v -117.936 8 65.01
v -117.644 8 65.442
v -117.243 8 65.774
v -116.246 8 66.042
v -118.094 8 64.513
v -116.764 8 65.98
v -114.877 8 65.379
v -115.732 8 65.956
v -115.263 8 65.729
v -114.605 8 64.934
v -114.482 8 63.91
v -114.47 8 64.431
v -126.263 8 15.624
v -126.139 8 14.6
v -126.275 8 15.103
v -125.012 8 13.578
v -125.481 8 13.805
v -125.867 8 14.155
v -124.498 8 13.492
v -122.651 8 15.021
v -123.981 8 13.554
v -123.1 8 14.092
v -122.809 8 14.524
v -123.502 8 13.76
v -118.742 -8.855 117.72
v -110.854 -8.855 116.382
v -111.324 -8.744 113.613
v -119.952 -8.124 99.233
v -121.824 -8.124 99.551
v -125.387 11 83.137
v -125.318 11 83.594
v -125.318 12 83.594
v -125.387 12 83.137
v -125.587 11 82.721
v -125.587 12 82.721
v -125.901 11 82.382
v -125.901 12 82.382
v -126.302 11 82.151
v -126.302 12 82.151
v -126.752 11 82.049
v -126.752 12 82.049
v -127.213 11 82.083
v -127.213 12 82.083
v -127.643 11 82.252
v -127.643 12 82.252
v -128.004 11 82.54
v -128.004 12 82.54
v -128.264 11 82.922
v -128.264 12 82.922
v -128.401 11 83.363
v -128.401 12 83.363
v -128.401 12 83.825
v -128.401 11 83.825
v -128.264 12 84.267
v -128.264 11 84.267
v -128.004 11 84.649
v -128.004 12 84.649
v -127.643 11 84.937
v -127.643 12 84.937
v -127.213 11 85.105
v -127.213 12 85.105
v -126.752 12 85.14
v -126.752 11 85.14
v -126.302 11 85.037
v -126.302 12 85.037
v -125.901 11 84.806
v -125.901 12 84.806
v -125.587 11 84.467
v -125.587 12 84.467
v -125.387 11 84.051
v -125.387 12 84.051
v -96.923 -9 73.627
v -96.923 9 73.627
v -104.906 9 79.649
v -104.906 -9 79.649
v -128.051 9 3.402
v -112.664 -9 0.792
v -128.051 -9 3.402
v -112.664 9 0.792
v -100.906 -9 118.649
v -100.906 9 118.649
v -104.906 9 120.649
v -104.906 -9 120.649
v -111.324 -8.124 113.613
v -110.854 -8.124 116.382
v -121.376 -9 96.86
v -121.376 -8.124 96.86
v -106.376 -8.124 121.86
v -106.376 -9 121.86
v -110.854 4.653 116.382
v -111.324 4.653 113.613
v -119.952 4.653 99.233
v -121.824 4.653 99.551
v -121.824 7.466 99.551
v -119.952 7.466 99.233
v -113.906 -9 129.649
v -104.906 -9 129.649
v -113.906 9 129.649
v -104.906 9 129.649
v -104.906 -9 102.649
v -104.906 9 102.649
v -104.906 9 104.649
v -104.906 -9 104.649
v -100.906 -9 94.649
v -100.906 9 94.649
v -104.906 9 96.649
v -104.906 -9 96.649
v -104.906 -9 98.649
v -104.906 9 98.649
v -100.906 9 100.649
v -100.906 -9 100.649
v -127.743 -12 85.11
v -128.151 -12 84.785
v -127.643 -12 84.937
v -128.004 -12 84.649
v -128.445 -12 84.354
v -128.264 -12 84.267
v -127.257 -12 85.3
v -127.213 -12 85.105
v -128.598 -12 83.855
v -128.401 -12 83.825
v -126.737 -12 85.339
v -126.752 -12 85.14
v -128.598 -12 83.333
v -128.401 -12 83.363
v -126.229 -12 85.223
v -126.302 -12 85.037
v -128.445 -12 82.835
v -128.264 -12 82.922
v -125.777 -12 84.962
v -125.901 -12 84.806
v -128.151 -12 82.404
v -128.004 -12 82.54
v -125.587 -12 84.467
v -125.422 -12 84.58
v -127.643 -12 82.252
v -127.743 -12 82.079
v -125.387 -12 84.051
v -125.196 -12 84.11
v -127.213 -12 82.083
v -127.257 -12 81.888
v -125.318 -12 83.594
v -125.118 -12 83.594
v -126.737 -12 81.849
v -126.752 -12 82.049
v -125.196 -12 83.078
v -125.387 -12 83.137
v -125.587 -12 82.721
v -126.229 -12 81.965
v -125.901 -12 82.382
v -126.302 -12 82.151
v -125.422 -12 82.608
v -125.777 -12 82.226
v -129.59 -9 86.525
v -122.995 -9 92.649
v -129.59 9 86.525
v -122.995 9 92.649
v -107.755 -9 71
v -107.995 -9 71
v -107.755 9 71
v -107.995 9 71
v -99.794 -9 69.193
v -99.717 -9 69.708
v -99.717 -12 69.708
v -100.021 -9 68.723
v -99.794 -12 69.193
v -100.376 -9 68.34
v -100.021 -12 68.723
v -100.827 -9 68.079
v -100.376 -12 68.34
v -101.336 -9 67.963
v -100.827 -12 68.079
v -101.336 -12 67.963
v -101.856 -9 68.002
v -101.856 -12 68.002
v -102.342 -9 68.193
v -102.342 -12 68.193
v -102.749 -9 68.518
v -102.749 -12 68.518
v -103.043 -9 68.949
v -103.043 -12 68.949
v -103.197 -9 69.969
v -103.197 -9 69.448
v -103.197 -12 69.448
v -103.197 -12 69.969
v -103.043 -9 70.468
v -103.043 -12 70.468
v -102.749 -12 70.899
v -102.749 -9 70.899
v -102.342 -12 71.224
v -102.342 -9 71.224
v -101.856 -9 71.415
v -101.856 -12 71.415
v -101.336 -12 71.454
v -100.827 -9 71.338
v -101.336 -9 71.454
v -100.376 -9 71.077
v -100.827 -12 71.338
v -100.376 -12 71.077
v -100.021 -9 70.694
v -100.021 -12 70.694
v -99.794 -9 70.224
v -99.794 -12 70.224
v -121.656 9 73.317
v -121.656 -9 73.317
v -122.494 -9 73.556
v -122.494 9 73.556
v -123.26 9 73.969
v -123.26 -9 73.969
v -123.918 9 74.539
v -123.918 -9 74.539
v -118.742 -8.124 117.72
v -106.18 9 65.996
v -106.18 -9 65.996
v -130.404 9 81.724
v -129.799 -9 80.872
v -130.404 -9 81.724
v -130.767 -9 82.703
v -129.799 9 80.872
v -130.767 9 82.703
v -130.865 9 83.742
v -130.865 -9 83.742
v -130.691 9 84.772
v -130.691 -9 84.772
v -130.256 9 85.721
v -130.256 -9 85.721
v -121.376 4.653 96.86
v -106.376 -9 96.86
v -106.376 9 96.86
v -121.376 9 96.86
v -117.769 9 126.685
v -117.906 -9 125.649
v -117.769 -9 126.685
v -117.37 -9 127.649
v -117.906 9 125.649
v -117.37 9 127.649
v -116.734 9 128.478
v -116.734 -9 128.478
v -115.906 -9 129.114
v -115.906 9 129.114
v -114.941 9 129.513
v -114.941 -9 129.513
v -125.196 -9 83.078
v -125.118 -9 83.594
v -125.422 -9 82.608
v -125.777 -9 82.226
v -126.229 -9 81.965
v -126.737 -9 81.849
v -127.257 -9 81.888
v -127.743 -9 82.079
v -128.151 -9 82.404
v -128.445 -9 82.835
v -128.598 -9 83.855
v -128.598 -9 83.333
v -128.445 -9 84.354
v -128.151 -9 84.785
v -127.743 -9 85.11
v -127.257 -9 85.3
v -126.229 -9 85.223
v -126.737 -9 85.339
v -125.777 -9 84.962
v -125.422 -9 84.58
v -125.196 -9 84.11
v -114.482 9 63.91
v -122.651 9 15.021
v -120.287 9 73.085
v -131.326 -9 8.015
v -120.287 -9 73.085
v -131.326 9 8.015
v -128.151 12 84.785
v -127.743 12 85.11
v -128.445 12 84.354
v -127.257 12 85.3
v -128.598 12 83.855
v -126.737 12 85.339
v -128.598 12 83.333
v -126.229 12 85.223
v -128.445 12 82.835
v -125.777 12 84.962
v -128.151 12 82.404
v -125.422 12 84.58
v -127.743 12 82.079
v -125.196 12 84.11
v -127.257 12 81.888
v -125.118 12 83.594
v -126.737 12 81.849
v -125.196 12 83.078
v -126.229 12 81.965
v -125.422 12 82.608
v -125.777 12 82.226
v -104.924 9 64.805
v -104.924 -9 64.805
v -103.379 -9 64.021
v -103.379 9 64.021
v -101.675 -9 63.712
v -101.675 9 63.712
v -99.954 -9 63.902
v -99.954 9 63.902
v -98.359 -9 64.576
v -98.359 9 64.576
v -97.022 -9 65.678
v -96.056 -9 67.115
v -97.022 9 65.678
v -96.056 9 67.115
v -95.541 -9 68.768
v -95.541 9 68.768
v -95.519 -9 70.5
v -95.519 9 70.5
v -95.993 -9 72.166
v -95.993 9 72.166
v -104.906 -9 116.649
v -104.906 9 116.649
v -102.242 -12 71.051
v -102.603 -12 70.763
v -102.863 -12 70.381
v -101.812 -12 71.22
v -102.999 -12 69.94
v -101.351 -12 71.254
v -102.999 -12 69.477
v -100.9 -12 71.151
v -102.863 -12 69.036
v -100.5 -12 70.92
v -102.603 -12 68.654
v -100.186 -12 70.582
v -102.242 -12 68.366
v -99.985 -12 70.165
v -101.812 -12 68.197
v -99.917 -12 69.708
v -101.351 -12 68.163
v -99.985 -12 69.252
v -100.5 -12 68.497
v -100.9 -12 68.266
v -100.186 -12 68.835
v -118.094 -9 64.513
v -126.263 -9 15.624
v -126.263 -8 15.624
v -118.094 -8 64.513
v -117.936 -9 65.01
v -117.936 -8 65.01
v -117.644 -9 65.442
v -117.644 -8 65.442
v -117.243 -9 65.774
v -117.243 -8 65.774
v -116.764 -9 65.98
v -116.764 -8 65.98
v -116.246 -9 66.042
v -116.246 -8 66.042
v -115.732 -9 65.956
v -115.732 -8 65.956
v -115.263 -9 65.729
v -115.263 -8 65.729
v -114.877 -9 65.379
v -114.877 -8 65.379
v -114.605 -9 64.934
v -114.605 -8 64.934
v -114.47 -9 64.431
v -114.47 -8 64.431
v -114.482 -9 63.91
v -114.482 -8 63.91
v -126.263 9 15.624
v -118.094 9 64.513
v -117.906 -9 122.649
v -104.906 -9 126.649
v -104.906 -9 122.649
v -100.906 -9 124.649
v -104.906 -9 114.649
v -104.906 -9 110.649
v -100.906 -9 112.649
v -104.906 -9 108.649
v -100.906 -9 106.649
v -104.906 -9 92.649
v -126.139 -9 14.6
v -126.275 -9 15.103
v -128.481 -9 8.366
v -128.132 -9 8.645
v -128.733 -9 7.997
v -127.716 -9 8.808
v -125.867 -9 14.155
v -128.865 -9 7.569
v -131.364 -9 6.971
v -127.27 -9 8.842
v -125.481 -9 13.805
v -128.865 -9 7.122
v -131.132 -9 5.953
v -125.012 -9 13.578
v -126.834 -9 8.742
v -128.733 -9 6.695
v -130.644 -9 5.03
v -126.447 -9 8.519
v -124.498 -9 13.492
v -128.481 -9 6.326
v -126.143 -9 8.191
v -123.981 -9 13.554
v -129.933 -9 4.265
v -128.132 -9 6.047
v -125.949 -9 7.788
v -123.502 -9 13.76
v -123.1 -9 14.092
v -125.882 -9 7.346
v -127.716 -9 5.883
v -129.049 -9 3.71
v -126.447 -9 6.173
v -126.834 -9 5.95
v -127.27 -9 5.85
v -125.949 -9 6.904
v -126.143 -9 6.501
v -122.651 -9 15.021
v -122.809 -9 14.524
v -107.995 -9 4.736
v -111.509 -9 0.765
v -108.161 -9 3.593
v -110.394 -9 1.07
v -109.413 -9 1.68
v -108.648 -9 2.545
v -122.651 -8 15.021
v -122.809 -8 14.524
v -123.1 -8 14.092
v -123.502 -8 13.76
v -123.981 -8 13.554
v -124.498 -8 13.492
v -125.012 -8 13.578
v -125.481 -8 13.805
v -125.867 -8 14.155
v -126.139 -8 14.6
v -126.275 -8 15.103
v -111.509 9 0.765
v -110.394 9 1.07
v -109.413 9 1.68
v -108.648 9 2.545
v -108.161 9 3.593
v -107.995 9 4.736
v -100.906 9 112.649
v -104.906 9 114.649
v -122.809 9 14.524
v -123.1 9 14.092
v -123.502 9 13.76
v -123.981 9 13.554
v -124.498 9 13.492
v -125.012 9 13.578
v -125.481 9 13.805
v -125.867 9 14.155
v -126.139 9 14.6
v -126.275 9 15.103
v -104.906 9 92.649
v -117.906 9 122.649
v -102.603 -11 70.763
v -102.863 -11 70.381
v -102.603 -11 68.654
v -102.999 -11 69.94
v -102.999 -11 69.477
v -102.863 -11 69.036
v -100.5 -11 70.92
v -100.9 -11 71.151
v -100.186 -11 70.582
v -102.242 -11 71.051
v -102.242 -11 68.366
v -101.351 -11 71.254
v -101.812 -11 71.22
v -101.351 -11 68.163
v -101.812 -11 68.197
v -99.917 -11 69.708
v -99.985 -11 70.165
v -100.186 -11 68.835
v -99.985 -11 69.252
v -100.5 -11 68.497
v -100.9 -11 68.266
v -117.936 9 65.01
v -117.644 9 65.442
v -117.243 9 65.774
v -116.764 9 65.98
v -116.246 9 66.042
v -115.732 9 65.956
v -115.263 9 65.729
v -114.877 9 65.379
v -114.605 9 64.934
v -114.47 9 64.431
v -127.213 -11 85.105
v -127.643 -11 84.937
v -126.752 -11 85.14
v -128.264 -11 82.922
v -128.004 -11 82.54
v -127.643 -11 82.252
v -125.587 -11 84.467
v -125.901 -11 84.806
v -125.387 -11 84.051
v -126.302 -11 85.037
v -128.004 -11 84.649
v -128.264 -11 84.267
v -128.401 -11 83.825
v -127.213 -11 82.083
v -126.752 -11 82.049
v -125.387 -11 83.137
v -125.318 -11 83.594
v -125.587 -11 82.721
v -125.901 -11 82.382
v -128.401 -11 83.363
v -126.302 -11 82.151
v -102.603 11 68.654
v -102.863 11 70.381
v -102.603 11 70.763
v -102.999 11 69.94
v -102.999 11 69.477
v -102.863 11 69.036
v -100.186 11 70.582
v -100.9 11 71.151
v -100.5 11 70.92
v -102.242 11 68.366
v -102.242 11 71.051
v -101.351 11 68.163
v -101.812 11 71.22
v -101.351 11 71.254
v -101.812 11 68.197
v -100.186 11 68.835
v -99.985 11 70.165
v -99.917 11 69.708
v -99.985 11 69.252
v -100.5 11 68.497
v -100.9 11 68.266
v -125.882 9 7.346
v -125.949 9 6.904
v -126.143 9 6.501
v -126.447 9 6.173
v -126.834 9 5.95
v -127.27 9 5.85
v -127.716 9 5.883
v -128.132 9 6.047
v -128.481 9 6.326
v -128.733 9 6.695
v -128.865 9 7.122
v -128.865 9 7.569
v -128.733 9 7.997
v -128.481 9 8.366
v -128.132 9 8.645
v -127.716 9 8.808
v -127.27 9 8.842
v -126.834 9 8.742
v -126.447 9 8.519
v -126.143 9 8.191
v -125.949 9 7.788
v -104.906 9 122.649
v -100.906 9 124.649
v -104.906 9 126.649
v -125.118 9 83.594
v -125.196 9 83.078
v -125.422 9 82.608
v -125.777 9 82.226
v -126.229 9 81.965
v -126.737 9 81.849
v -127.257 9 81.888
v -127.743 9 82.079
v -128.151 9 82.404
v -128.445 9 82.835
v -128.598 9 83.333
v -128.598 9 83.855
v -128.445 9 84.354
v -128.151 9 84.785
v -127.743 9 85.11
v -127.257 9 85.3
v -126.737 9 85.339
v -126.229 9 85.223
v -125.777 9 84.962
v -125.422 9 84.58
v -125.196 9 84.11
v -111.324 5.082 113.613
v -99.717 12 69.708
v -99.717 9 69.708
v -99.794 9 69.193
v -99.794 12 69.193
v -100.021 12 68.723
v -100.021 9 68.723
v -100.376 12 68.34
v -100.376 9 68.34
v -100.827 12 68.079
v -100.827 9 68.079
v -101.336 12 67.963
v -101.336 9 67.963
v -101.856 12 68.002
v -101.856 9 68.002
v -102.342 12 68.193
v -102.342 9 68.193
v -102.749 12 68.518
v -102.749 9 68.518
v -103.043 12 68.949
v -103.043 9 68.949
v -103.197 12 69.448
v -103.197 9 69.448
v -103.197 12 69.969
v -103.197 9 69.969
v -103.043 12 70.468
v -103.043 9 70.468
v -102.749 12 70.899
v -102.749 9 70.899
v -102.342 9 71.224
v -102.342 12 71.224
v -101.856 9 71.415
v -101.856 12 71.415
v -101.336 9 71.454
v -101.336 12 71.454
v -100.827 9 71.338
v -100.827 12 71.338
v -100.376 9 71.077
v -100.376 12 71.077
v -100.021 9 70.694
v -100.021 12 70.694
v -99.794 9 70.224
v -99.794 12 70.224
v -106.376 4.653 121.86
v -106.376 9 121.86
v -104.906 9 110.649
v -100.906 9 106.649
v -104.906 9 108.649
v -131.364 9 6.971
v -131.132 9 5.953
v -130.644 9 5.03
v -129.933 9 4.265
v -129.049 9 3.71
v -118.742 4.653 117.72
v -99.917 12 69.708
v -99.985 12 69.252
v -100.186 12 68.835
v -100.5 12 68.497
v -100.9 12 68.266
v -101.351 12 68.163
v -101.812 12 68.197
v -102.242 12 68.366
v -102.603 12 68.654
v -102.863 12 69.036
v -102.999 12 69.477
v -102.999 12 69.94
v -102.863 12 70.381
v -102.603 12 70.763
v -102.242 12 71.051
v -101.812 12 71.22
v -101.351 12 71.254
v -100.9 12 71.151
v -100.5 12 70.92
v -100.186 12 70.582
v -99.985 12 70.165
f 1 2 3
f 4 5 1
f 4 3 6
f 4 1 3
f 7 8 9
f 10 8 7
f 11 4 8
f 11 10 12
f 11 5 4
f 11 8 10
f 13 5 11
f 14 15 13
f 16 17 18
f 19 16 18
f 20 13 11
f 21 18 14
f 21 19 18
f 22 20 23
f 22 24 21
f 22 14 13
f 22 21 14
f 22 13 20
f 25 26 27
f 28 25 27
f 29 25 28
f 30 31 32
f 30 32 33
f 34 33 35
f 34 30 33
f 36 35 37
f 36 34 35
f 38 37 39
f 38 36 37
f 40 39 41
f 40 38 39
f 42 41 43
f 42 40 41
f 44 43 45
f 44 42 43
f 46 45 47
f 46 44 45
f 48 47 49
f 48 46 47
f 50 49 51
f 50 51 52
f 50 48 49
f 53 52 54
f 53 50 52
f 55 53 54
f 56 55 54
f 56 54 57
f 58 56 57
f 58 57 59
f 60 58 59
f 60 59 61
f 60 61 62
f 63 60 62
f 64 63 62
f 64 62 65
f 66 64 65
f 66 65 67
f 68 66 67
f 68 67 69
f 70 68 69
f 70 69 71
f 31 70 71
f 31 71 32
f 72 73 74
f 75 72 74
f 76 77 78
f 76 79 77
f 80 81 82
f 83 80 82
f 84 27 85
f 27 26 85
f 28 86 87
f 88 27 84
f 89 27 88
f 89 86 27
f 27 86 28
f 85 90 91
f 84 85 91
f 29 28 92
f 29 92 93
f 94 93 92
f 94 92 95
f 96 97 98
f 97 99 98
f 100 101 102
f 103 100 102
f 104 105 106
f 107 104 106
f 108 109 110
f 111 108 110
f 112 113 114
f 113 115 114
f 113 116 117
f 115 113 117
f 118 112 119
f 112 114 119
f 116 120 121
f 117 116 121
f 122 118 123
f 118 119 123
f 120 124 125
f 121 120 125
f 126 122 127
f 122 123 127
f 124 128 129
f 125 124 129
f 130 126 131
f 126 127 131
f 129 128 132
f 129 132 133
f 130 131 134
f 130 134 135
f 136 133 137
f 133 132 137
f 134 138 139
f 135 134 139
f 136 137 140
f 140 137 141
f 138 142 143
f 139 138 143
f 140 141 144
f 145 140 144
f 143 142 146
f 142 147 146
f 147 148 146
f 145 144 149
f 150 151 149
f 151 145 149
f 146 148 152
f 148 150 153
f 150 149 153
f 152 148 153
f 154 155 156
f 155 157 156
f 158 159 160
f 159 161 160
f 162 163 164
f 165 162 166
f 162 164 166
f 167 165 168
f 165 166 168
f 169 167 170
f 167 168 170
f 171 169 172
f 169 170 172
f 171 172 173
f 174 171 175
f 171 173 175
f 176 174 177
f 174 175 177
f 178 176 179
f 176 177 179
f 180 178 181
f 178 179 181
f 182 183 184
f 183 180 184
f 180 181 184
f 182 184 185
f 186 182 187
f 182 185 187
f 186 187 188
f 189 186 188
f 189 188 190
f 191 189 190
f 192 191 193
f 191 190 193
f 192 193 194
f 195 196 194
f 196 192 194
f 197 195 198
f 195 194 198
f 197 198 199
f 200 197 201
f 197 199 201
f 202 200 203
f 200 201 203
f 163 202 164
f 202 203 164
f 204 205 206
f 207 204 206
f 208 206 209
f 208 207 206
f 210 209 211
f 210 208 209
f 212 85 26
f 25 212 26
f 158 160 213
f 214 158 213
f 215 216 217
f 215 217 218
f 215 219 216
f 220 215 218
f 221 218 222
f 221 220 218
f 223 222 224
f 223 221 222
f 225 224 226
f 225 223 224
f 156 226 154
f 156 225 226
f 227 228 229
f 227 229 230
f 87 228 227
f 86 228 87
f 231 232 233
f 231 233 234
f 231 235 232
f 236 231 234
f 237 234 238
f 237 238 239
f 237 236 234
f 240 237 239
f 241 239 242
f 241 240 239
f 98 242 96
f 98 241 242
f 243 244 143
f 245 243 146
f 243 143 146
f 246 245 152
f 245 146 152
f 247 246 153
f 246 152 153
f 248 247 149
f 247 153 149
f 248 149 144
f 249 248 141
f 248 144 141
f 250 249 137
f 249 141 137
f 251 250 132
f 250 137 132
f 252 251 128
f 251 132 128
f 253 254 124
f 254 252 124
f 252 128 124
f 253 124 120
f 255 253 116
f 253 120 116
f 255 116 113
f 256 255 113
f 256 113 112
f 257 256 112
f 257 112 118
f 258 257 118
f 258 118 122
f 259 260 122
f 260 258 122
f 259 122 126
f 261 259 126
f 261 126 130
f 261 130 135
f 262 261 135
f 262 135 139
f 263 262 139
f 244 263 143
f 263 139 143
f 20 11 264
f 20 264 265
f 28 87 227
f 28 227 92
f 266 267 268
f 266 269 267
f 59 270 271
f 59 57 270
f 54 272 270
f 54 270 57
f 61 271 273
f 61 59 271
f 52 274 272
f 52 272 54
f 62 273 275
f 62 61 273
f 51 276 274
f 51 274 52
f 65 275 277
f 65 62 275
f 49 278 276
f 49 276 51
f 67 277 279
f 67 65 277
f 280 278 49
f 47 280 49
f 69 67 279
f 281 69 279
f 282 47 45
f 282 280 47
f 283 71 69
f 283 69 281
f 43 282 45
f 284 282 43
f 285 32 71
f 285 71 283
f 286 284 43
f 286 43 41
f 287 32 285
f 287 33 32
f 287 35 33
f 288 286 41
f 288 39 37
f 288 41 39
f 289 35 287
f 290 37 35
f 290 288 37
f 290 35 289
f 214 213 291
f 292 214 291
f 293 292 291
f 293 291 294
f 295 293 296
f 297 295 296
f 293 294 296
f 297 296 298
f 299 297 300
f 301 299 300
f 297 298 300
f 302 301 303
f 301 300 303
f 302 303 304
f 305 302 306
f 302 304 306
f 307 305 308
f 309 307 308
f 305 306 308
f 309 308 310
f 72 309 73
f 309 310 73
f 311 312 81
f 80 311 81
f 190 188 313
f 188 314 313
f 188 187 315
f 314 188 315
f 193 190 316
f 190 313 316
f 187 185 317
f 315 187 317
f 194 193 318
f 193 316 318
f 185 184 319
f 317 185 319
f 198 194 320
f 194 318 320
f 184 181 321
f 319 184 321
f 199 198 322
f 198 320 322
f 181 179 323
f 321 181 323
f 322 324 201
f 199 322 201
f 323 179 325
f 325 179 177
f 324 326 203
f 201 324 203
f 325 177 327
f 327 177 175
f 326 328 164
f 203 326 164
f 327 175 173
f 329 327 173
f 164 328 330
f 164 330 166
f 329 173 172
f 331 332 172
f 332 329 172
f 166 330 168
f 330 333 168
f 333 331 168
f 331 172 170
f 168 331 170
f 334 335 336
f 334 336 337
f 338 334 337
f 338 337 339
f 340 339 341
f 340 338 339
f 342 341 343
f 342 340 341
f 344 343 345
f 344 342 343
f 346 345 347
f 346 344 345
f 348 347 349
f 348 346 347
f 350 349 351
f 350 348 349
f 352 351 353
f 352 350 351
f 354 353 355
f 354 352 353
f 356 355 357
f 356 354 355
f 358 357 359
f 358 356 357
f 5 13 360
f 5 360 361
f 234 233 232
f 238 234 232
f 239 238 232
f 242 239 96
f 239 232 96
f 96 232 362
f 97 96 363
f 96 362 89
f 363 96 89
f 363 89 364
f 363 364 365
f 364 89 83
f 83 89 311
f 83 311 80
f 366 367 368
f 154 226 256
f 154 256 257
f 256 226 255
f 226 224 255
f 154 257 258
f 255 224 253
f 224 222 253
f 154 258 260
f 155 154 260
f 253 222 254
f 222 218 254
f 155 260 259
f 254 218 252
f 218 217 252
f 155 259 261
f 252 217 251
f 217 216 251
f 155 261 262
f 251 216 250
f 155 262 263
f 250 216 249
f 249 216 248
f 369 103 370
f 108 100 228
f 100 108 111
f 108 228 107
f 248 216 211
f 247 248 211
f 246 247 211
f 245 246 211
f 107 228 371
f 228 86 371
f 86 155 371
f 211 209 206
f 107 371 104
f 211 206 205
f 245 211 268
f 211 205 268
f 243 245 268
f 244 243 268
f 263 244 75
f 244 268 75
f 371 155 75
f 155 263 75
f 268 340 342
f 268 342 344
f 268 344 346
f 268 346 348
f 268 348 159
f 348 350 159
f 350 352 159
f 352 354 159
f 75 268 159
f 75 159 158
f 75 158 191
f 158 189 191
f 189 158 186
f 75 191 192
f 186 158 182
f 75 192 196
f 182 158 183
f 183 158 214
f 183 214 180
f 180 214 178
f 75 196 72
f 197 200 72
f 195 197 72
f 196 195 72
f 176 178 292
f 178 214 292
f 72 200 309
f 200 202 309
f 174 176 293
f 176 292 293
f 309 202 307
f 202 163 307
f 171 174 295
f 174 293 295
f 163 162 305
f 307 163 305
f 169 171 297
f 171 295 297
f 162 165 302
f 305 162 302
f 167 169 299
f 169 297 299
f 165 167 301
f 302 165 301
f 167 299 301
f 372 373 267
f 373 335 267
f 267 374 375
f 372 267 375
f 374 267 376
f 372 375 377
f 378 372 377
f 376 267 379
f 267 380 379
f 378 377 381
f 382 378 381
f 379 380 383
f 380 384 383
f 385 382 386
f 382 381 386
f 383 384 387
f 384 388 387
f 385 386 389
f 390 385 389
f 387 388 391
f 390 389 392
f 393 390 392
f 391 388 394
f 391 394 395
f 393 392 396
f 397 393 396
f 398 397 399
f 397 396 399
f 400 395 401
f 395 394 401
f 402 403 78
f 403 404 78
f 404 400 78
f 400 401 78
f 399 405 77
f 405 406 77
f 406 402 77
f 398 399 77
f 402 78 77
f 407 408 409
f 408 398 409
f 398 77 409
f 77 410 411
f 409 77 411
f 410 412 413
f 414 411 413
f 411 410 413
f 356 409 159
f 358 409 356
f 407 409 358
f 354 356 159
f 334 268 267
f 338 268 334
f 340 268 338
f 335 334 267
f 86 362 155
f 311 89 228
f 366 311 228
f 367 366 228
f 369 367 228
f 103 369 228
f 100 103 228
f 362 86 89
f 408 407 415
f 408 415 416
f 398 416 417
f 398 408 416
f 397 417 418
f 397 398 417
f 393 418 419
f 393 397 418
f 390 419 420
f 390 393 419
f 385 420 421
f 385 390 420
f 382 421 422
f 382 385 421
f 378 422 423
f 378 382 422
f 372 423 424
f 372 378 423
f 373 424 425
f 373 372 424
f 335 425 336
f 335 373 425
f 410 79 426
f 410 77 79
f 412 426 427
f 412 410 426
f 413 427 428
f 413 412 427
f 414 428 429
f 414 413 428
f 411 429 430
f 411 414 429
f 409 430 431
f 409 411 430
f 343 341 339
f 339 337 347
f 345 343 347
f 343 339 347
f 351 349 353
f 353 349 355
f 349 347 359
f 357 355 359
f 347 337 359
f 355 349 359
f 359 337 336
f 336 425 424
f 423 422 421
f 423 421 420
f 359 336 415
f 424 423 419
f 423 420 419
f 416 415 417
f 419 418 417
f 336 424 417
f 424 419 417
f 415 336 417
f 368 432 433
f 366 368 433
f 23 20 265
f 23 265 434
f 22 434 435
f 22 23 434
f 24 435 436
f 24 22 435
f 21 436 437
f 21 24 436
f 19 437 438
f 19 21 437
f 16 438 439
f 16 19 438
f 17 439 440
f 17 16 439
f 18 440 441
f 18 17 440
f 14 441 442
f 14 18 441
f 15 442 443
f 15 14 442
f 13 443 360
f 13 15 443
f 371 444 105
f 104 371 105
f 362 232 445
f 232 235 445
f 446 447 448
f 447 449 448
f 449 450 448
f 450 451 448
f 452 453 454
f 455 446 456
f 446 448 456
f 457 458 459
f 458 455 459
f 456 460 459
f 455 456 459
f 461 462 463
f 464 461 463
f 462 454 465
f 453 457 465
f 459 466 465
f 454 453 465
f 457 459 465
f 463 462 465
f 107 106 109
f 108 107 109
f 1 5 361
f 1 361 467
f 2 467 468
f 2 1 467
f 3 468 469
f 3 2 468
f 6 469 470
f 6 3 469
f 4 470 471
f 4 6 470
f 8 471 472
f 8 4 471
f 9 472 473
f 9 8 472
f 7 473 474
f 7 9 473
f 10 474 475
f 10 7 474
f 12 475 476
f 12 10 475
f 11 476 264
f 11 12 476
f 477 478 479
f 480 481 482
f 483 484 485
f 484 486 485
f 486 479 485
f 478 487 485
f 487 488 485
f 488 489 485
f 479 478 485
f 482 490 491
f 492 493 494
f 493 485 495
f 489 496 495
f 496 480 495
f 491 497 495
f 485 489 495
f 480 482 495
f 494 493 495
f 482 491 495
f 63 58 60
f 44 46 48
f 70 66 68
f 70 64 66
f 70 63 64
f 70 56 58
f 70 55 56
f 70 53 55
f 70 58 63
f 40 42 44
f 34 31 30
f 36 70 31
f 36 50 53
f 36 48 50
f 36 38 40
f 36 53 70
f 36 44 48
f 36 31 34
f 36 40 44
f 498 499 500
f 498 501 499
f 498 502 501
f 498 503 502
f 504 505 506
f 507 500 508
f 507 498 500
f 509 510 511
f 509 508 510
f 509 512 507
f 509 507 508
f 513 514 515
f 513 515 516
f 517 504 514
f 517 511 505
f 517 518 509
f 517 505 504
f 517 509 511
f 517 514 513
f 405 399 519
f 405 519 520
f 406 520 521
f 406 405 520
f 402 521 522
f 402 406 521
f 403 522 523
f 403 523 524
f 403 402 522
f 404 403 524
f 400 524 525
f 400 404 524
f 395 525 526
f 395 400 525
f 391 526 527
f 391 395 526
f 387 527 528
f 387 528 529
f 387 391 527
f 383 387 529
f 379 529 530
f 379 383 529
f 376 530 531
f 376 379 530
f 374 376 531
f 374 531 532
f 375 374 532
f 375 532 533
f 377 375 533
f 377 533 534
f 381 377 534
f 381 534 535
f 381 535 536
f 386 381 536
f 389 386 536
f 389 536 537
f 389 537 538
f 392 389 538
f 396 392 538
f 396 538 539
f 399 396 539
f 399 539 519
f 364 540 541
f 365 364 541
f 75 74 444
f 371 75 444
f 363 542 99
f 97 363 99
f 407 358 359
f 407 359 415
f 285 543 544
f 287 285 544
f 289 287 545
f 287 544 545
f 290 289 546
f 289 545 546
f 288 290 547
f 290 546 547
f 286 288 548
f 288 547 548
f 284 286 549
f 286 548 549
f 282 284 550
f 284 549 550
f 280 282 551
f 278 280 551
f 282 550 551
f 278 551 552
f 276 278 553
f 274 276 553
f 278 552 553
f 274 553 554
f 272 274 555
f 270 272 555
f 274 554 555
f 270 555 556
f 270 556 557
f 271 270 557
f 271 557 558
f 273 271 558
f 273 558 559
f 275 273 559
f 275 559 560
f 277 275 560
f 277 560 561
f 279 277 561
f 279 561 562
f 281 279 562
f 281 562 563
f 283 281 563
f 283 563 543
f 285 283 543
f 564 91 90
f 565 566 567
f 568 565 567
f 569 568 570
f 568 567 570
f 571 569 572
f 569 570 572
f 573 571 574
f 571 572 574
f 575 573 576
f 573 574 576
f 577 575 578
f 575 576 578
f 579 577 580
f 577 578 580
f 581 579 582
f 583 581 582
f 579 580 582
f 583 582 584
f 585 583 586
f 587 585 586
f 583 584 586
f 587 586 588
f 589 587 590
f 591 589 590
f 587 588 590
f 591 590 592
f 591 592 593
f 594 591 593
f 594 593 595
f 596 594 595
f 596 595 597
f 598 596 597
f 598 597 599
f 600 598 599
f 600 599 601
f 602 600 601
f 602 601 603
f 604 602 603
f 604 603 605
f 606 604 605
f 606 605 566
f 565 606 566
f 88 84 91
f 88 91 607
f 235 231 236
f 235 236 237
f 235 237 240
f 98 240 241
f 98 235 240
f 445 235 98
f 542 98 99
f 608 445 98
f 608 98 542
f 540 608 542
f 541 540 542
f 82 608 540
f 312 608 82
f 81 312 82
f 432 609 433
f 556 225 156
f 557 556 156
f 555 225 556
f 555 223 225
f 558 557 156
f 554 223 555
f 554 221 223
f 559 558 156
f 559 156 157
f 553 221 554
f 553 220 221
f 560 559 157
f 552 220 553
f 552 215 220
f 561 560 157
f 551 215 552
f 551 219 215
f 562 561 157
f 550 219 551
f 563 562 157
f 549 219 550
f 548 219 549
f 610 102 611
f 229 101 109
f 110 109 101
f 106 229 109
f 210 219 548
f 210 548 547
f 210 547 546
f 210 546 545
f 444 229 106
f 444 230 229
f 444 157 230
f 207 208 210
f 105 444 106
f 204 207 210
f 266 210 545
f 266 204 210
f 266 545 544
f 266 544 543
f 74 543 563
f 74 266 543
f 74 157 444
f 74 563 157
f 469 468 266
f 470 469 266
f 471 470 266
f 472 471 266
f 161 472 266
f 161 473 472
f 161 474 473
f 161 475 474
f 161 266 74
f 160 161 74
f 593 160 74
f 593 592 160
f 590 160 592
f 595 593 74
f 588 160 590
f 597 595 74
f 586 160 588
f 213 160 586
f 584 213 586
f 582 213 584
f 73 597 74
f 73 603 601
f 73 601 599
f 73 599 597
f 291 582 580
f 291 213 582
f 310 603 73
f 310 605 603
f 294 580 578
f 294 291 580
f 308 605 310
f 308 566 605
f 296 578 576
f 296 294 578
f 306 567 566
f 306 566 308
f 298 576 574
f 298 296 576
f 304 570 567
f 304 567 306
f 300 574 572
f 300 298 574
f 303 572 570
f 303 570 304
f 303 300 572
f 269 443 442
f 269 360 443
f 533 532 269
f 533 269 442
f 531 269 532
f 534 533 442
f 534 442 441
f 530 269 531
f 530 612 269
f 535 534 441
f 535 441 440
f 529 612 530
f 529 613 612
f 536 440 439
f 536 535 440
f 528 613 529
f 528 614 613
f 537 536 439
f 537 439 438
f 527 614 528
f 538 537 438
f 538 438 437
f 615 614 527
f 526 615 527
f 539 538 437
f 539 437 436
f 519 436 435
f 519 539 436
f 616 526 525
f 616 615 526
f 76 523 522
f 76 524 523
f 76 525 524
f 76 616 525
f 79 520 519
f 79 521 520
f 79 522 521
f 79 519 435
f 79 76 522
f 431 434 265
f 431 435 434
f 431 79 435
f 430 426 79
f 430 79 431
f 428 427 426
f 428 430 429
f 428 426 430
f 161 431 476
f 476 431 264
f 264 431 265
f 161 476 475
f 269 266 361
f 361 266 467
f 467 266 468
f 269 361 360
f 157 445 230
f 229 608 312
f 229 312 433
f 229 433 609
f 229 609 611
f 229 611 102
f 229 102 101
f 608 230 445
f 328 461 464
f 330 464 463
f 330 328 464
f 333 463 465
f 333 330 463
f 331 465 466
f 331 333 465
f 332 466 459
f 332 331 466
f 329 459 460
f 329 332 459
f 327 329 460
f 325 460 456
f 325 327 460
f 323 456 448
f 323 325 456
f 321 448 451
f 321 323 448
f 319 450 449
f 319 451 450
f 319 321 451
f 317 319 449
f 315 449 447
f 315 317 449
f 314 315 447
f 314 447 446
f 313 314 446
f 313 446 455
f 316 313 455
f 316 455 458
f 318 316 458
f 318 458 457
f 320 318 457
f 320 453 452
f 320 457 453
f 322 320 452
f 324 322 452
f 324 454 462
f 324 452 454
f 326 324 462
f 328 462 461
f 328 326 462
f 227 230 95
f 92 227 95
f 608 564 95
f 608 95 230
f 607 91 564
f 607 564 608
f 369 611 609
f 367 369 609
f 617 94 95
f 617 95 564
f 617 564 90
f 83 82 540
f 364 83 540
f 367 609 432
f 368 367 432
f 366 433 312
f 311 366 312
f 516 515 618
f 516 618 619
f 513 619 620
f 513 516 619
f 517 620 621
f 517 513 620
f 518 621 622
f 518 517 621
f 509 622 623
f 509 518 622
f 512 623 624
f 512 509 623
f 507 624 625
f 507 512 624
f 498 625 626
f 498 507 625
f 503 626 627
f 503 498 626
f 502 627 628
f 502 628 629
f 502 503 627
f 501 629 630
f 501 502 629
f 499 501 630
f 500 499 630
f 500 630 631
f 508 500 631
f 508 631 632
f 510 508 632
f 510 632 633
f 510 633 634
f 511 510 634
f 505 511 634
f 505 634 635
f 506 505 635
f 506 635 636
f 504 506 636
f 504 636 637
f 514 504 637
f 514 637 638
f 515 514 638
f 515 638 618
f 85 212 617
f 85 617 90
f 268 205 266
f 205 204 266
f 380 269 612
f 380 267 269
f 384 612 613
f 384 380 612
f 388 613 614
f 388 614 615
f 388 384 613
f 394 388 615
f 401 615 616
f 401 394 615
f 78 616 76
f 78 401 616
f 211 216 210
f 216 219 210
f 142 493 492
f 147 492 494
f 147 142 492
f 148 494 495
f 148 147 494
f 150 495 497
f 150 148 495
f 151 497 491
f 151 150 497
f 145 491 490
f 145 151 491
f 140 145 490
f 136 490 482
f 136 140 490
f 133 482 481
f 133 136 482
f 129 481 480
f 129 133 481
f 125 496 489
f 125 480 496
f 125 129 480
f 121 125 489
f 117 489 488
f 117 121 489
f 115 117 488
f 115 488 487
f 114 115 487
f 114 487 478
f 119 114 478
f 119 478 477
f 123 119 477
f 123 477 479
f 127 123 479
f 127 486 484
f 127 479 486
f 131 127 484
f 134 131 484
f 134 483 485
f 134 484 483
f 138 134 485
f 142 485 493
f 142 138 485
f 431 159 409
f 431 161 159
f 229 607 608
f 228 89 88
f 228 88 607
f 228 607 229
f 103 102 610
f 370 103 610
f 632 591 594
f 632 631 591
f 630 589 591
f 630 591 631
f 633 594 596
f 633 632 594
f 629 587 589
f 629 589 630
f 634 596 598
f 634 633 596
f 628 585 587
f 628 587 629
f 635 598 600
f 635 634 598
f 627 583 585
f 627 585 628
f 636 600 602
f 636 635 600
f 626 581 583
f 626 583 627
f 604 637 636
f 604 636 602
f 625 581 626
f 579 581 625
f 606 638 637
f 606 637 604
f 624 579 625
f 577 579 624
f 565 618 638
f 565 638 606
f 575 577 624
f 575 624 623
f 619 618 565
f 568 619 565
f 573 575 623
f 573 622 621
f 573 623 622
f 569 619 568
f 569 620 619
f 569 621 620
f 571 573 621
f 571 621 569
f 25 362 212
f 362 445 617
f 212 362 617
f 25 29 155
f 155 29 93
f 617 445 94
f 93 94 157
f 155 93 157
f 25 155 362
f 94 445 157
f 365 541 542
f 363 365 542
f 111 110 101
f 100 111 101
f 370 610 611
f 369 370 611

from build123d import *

# Parameters (mm, degrees)
BOSS_EXTRUDE2_DEPTH   = 9
FILLET3_R             = 4
FILLET4_R             = 4
FILLET5_R             = 4
BOSS_EXTRUDE3_DEPTH   = 18
LPATTERN1_COUNT       = 6
LPATTERN1_PITCH       = 6
MIRROR1_START         = -8.124245185
MIRROR1_OUTLINE_R     = 1.5
MIRROR1_DEPTH         = 12.777246129
MIRROR1_START_2       = -9
MIRROR1_2_OUTLINE_R   = 1.5
MIRROR1_2_DEPTH       = 18
MIRROR1_3_DEPTH       = 1
MIRROR1_START_3       = 8
MIRROR1_4_DEPTH       = 1
MIRROR1_START_4       = -11
MIRROR1_5_OUTLINE_R   = 1.75
MIRROR1_5_DEPTH       = 22
MIRROR1_START_5       = -12
MIRROR1_6_OUTLINE_R   = 1.75
MIRROR1_6_OUTLINE_R_2 = 1.55
MIRROR1_6_DEPTH       = 24
MIRROR1_START_6       = -136.757331166
MIRROR1_7_DEPTH       = 7.999999999


with BuildPart() as part:
    # Sketch2 → Boss-Extrude2 (new, symmetric)
    with BuildSketch(Plane(origin=(0, 0, 0), x_dir=(1, 0, 0), z_dir=(0, 1, 0))):
        Polygon((-131.994556455, -4.071203001), (-120.287458623, -73.085287508), (-107.994556455, -71), (-107.994556455, 0), align=None)
        with BuildLine():
            ThreePointArc((-106.180430892, -65.996333846), (-97.650502603, -65.078471315), (-96.922675808, -73.626711859))
            Line((-96.922675808, -73.626711859), (-104.905552704, -79.64947505))
            Line((-104.905552704, -79.64947505), (-104.905552704, -129.64947505))
            Line((-104.905552704, -129.64947505), (-117.905552704, -129.64947505))
            Line((-117.905552704, -129.64947505), (-117.905552704, -122.64947505))
            Line((-117.905552704, -122.64947505), (-122.994556455, -92.64947505))
            Line((-122.994556455, -92.64947505), (-132.520871847, -83.803610759))
            Line((-132.520871847, -83.803610759), (-122.994556455, -73.544501876))
            Line((-122.994556455, -73.544501876), (-107.994556455, -71))
            Line((-107.994556455, -71), (-107.755356075, -71))
            Line((-107.755356075, -71), (-106.180430892, -65.996333846))
        make_face()
    extrude(amount=BOSS_EXTRUDE2_DEPTH, both=True)

    # Fillet3
    fillet3_edges = [part.edges().sort_by_distance(p)[0] for p in [
        (-131.994556455, 0, 4.071203001),
        (-107.994556455, 0, 0),
    ]]
    fillet(fillet3_edges, radius=FILLET3_R)

    # Fillet4
    fillet4_edges = [part.edges().sort_by_distance(p)[0] for p in [
        (-132.520871847, 0, 83.803610759),
        (-122.994556455, 0, 73.544501876),
    ]]
    fillet(fillet4_edges, radius=FILLET4_R)

    # Fillet5
    fillet5_edges = [part.edges().sort_by_distance(p)[0] for p in [
        (-117.905552704, 0, 129.64947505),
    ]]
    fillet(fillet5_edges, radius=FILLET5_R)

    # Sketch4 → Boss-Extrude3 (add)
    with BuildSketch(Plane(origin=(0, 9, 0), x_dir=(1, 0, 0), z_dir=(0, 1, 0))):
        Polygon((-104.905552704, -126.64947505), (-104.905552704, -122.64947505), (-100.905552704, -124.64947505), align=None)
    boss_extrude3 = extrude(amount=-BOSS_EXTRUDE3_DEPTH)

    # LPattern1: Boss-Extrude3 ×6
    with Locations(*[(0, 0, -i * LPATTERN1_PITCH) for i in range(1, LPATTERN1_COUNT)]):
        add(boss_extrude3)

    # Mirror1: read off the stored shape, not the designer's step
    # Mirror1 outline → Mirror1 (cut)
    with BuildSketch(Plane(origin=(0, 0, 0), x_dir=(1, 0, 0), z_dir=(0, 1, 0)).offset(MIRROR1_START)):
        Polygon((-106.375961974, -96.859639276), (-121.375961974, -96.859639276), (-119.951756879, -99.233314435), (-121.823846672, -99.550883501), (-118.741773978, -117.719897586), (-110.854450034, -116.381943548), (-111.324238264, -113.612512127), (-106.375961974, -121.859639276), align=None)
        with Locations((-127.381917465, -7.345887954)):
            Circle(MIRROR1_OUTLINE_R)
    extrude(amount=MIRROR1_DEPTH, mode=Mode.SUBTRACT)

    # Mirror1 2 outline → Mirror1 2 (cut)
    with BuildSketch(Plane(origin=(0, 0, 0), x_dir=(1, 0, 0), z_dir=(0, 1, 0)).offset(MIRROR1_START_2)):
        Polygon((-106.375961974, -96.859639276), (-121.375961974, -96.859639276), (-106.375961974, -121.859639276), align=None)
        with Locations((-127.381917465, -7.345887954)):
            Circle(MIRROR1_2_OUTLINE_R)
    extrude(amount=MIRROR1_2_DEPTH, mode=Mode.SUBTRACT)

    # Mirror1 3 outline → Mirror1 3 (cut)
    with BuildSketch(Plane(origin=(0, 0, 0), x_dir=(1, 0, 0), z_dir=(0, 1, 0)).offset(MIRROR1_START_2)):
        with BuildLine():
            Line((-114.481804476, -63.909695389), (-122.650561904, -15.020919875))
            ThreePointArc((-122.650561904, -15.020919875), (-124.758454252, -13.516588893), (-126.262785233, -15.624481241))
            Line((-126.262785233, -15.624481241), (-118.094027806, -64.513256756))
            ThreePointArc((-118.094027806, -64.513256756), (-115.986135457, -66.017587738), (-114.481804476, -63.909695389))
        make_face()
    extrude(amount=MIRROR1_3_DEPTH, mode=Mode.SUBTRACT)

    # Mirror1 4 outline → Mirror1 4 (cut)
    with BuildSketch(Plane(origin=(0, 0, 0), x_dir=(1, 0, 0), z_dir=(0, 1, 0)).offset(MIRROR1_START_3)):
        with BuildLine():
            Line((-114.481804476, -63.909695389), (-122.650561904, -15.020919875))
            ThreePointArc((-122.650561904, -15.020919875), (-124.758454252, -13.516588893), (-126.262785233, -15.624481241))
            Line((-126.262785233, -15.624481241), (-118.094027806, -64.513256756))
            ThreePointArc((-118.094027806, -64.513256756), (-115.986135457, -66.017587738), (-114.481804476, -63.909695389))
        make_face()
    extrude(amount=MIRROR1_4_DEPTH, mode=Mode.SUBTRACT)

    # Mirror1 5 outline → Mirror1 5 (add)
    with BuildSketch(Plane(origin=(0, 0, 0), x_dir=(1, 0, 0), z_dir=(0, 1, 0)).offset(MIRROR1_START_4)):
        with Locations((-126.867893483, -83.59424119)):
            Circle(MIRROR1_5_OUTLINE_R)
        with Locations((-101.466636513, -69.708495286)):
            Circle(MIRROR1_5_OUTLINE_R)
    extrude(amount=MIRROR1_5_DEPTH)

    # Mirror1 6 outline → Mirror1 6 (add)
    # profile 1 of 2: a face of its own
    with BuildSketch(Plane(origin=(0, 0, 0), x_dir=(1, 0, 0), z_dir=(0, 1, 0)).offset(MIRROR1_START_5)):
        with Locations((-126.867893483, -83.59424119)):
            Circle(MIRROR1_6_OUTLINE_R)
        with Locations((-126.867893483, -83.59424119)):
            Circle(MIRROR1_6_OUTLINE_R_2, mode=Mode.SUBTRACT)
    # profile 2 of 2: a face of its own
    with BuildSketch(Plane(origin=(0, 0, 0), x_dir=(1, 0, 0), z_dir=(0, 1, 0)).offset(MIRROR1_START_5)):
        with Locations((-101.466636513, -69.708495286)):
            Circle(MIRROR1_6_OUTLINE_R)
        with Locations((-101.466636513, -69.708495286)):
            Circle(MIRROR1_6_OUTLINE_R_2, mode=Mode.SUBTRACT)
    extrude(amount=MIRROR1_6_DEPTH)

    # Mirror1 7 outline → Mirror1 7 (cut)
    with BuildSketch(Plane(origin=(0, 0, 0), x_dir=(0, 1, 0), z_dir=(0.9859154929577465, 0, -0.1672442547470129)).offset(MIRROR1_START_6)):
        Polygon((4.653000944, 77.774419934), (7.4664805, 77.774419934), (4.653000944, 96.202991363), align=None)
        Polygon((-8.124245185, 77.774419934), (-8.124245185, 96.202991363), (-8.855207199, 96.202991363), align=None)
    extrude(amount=MIRROR1_7_DEPTH, mode=Mode.SUBTRACT)


solid = part.part
